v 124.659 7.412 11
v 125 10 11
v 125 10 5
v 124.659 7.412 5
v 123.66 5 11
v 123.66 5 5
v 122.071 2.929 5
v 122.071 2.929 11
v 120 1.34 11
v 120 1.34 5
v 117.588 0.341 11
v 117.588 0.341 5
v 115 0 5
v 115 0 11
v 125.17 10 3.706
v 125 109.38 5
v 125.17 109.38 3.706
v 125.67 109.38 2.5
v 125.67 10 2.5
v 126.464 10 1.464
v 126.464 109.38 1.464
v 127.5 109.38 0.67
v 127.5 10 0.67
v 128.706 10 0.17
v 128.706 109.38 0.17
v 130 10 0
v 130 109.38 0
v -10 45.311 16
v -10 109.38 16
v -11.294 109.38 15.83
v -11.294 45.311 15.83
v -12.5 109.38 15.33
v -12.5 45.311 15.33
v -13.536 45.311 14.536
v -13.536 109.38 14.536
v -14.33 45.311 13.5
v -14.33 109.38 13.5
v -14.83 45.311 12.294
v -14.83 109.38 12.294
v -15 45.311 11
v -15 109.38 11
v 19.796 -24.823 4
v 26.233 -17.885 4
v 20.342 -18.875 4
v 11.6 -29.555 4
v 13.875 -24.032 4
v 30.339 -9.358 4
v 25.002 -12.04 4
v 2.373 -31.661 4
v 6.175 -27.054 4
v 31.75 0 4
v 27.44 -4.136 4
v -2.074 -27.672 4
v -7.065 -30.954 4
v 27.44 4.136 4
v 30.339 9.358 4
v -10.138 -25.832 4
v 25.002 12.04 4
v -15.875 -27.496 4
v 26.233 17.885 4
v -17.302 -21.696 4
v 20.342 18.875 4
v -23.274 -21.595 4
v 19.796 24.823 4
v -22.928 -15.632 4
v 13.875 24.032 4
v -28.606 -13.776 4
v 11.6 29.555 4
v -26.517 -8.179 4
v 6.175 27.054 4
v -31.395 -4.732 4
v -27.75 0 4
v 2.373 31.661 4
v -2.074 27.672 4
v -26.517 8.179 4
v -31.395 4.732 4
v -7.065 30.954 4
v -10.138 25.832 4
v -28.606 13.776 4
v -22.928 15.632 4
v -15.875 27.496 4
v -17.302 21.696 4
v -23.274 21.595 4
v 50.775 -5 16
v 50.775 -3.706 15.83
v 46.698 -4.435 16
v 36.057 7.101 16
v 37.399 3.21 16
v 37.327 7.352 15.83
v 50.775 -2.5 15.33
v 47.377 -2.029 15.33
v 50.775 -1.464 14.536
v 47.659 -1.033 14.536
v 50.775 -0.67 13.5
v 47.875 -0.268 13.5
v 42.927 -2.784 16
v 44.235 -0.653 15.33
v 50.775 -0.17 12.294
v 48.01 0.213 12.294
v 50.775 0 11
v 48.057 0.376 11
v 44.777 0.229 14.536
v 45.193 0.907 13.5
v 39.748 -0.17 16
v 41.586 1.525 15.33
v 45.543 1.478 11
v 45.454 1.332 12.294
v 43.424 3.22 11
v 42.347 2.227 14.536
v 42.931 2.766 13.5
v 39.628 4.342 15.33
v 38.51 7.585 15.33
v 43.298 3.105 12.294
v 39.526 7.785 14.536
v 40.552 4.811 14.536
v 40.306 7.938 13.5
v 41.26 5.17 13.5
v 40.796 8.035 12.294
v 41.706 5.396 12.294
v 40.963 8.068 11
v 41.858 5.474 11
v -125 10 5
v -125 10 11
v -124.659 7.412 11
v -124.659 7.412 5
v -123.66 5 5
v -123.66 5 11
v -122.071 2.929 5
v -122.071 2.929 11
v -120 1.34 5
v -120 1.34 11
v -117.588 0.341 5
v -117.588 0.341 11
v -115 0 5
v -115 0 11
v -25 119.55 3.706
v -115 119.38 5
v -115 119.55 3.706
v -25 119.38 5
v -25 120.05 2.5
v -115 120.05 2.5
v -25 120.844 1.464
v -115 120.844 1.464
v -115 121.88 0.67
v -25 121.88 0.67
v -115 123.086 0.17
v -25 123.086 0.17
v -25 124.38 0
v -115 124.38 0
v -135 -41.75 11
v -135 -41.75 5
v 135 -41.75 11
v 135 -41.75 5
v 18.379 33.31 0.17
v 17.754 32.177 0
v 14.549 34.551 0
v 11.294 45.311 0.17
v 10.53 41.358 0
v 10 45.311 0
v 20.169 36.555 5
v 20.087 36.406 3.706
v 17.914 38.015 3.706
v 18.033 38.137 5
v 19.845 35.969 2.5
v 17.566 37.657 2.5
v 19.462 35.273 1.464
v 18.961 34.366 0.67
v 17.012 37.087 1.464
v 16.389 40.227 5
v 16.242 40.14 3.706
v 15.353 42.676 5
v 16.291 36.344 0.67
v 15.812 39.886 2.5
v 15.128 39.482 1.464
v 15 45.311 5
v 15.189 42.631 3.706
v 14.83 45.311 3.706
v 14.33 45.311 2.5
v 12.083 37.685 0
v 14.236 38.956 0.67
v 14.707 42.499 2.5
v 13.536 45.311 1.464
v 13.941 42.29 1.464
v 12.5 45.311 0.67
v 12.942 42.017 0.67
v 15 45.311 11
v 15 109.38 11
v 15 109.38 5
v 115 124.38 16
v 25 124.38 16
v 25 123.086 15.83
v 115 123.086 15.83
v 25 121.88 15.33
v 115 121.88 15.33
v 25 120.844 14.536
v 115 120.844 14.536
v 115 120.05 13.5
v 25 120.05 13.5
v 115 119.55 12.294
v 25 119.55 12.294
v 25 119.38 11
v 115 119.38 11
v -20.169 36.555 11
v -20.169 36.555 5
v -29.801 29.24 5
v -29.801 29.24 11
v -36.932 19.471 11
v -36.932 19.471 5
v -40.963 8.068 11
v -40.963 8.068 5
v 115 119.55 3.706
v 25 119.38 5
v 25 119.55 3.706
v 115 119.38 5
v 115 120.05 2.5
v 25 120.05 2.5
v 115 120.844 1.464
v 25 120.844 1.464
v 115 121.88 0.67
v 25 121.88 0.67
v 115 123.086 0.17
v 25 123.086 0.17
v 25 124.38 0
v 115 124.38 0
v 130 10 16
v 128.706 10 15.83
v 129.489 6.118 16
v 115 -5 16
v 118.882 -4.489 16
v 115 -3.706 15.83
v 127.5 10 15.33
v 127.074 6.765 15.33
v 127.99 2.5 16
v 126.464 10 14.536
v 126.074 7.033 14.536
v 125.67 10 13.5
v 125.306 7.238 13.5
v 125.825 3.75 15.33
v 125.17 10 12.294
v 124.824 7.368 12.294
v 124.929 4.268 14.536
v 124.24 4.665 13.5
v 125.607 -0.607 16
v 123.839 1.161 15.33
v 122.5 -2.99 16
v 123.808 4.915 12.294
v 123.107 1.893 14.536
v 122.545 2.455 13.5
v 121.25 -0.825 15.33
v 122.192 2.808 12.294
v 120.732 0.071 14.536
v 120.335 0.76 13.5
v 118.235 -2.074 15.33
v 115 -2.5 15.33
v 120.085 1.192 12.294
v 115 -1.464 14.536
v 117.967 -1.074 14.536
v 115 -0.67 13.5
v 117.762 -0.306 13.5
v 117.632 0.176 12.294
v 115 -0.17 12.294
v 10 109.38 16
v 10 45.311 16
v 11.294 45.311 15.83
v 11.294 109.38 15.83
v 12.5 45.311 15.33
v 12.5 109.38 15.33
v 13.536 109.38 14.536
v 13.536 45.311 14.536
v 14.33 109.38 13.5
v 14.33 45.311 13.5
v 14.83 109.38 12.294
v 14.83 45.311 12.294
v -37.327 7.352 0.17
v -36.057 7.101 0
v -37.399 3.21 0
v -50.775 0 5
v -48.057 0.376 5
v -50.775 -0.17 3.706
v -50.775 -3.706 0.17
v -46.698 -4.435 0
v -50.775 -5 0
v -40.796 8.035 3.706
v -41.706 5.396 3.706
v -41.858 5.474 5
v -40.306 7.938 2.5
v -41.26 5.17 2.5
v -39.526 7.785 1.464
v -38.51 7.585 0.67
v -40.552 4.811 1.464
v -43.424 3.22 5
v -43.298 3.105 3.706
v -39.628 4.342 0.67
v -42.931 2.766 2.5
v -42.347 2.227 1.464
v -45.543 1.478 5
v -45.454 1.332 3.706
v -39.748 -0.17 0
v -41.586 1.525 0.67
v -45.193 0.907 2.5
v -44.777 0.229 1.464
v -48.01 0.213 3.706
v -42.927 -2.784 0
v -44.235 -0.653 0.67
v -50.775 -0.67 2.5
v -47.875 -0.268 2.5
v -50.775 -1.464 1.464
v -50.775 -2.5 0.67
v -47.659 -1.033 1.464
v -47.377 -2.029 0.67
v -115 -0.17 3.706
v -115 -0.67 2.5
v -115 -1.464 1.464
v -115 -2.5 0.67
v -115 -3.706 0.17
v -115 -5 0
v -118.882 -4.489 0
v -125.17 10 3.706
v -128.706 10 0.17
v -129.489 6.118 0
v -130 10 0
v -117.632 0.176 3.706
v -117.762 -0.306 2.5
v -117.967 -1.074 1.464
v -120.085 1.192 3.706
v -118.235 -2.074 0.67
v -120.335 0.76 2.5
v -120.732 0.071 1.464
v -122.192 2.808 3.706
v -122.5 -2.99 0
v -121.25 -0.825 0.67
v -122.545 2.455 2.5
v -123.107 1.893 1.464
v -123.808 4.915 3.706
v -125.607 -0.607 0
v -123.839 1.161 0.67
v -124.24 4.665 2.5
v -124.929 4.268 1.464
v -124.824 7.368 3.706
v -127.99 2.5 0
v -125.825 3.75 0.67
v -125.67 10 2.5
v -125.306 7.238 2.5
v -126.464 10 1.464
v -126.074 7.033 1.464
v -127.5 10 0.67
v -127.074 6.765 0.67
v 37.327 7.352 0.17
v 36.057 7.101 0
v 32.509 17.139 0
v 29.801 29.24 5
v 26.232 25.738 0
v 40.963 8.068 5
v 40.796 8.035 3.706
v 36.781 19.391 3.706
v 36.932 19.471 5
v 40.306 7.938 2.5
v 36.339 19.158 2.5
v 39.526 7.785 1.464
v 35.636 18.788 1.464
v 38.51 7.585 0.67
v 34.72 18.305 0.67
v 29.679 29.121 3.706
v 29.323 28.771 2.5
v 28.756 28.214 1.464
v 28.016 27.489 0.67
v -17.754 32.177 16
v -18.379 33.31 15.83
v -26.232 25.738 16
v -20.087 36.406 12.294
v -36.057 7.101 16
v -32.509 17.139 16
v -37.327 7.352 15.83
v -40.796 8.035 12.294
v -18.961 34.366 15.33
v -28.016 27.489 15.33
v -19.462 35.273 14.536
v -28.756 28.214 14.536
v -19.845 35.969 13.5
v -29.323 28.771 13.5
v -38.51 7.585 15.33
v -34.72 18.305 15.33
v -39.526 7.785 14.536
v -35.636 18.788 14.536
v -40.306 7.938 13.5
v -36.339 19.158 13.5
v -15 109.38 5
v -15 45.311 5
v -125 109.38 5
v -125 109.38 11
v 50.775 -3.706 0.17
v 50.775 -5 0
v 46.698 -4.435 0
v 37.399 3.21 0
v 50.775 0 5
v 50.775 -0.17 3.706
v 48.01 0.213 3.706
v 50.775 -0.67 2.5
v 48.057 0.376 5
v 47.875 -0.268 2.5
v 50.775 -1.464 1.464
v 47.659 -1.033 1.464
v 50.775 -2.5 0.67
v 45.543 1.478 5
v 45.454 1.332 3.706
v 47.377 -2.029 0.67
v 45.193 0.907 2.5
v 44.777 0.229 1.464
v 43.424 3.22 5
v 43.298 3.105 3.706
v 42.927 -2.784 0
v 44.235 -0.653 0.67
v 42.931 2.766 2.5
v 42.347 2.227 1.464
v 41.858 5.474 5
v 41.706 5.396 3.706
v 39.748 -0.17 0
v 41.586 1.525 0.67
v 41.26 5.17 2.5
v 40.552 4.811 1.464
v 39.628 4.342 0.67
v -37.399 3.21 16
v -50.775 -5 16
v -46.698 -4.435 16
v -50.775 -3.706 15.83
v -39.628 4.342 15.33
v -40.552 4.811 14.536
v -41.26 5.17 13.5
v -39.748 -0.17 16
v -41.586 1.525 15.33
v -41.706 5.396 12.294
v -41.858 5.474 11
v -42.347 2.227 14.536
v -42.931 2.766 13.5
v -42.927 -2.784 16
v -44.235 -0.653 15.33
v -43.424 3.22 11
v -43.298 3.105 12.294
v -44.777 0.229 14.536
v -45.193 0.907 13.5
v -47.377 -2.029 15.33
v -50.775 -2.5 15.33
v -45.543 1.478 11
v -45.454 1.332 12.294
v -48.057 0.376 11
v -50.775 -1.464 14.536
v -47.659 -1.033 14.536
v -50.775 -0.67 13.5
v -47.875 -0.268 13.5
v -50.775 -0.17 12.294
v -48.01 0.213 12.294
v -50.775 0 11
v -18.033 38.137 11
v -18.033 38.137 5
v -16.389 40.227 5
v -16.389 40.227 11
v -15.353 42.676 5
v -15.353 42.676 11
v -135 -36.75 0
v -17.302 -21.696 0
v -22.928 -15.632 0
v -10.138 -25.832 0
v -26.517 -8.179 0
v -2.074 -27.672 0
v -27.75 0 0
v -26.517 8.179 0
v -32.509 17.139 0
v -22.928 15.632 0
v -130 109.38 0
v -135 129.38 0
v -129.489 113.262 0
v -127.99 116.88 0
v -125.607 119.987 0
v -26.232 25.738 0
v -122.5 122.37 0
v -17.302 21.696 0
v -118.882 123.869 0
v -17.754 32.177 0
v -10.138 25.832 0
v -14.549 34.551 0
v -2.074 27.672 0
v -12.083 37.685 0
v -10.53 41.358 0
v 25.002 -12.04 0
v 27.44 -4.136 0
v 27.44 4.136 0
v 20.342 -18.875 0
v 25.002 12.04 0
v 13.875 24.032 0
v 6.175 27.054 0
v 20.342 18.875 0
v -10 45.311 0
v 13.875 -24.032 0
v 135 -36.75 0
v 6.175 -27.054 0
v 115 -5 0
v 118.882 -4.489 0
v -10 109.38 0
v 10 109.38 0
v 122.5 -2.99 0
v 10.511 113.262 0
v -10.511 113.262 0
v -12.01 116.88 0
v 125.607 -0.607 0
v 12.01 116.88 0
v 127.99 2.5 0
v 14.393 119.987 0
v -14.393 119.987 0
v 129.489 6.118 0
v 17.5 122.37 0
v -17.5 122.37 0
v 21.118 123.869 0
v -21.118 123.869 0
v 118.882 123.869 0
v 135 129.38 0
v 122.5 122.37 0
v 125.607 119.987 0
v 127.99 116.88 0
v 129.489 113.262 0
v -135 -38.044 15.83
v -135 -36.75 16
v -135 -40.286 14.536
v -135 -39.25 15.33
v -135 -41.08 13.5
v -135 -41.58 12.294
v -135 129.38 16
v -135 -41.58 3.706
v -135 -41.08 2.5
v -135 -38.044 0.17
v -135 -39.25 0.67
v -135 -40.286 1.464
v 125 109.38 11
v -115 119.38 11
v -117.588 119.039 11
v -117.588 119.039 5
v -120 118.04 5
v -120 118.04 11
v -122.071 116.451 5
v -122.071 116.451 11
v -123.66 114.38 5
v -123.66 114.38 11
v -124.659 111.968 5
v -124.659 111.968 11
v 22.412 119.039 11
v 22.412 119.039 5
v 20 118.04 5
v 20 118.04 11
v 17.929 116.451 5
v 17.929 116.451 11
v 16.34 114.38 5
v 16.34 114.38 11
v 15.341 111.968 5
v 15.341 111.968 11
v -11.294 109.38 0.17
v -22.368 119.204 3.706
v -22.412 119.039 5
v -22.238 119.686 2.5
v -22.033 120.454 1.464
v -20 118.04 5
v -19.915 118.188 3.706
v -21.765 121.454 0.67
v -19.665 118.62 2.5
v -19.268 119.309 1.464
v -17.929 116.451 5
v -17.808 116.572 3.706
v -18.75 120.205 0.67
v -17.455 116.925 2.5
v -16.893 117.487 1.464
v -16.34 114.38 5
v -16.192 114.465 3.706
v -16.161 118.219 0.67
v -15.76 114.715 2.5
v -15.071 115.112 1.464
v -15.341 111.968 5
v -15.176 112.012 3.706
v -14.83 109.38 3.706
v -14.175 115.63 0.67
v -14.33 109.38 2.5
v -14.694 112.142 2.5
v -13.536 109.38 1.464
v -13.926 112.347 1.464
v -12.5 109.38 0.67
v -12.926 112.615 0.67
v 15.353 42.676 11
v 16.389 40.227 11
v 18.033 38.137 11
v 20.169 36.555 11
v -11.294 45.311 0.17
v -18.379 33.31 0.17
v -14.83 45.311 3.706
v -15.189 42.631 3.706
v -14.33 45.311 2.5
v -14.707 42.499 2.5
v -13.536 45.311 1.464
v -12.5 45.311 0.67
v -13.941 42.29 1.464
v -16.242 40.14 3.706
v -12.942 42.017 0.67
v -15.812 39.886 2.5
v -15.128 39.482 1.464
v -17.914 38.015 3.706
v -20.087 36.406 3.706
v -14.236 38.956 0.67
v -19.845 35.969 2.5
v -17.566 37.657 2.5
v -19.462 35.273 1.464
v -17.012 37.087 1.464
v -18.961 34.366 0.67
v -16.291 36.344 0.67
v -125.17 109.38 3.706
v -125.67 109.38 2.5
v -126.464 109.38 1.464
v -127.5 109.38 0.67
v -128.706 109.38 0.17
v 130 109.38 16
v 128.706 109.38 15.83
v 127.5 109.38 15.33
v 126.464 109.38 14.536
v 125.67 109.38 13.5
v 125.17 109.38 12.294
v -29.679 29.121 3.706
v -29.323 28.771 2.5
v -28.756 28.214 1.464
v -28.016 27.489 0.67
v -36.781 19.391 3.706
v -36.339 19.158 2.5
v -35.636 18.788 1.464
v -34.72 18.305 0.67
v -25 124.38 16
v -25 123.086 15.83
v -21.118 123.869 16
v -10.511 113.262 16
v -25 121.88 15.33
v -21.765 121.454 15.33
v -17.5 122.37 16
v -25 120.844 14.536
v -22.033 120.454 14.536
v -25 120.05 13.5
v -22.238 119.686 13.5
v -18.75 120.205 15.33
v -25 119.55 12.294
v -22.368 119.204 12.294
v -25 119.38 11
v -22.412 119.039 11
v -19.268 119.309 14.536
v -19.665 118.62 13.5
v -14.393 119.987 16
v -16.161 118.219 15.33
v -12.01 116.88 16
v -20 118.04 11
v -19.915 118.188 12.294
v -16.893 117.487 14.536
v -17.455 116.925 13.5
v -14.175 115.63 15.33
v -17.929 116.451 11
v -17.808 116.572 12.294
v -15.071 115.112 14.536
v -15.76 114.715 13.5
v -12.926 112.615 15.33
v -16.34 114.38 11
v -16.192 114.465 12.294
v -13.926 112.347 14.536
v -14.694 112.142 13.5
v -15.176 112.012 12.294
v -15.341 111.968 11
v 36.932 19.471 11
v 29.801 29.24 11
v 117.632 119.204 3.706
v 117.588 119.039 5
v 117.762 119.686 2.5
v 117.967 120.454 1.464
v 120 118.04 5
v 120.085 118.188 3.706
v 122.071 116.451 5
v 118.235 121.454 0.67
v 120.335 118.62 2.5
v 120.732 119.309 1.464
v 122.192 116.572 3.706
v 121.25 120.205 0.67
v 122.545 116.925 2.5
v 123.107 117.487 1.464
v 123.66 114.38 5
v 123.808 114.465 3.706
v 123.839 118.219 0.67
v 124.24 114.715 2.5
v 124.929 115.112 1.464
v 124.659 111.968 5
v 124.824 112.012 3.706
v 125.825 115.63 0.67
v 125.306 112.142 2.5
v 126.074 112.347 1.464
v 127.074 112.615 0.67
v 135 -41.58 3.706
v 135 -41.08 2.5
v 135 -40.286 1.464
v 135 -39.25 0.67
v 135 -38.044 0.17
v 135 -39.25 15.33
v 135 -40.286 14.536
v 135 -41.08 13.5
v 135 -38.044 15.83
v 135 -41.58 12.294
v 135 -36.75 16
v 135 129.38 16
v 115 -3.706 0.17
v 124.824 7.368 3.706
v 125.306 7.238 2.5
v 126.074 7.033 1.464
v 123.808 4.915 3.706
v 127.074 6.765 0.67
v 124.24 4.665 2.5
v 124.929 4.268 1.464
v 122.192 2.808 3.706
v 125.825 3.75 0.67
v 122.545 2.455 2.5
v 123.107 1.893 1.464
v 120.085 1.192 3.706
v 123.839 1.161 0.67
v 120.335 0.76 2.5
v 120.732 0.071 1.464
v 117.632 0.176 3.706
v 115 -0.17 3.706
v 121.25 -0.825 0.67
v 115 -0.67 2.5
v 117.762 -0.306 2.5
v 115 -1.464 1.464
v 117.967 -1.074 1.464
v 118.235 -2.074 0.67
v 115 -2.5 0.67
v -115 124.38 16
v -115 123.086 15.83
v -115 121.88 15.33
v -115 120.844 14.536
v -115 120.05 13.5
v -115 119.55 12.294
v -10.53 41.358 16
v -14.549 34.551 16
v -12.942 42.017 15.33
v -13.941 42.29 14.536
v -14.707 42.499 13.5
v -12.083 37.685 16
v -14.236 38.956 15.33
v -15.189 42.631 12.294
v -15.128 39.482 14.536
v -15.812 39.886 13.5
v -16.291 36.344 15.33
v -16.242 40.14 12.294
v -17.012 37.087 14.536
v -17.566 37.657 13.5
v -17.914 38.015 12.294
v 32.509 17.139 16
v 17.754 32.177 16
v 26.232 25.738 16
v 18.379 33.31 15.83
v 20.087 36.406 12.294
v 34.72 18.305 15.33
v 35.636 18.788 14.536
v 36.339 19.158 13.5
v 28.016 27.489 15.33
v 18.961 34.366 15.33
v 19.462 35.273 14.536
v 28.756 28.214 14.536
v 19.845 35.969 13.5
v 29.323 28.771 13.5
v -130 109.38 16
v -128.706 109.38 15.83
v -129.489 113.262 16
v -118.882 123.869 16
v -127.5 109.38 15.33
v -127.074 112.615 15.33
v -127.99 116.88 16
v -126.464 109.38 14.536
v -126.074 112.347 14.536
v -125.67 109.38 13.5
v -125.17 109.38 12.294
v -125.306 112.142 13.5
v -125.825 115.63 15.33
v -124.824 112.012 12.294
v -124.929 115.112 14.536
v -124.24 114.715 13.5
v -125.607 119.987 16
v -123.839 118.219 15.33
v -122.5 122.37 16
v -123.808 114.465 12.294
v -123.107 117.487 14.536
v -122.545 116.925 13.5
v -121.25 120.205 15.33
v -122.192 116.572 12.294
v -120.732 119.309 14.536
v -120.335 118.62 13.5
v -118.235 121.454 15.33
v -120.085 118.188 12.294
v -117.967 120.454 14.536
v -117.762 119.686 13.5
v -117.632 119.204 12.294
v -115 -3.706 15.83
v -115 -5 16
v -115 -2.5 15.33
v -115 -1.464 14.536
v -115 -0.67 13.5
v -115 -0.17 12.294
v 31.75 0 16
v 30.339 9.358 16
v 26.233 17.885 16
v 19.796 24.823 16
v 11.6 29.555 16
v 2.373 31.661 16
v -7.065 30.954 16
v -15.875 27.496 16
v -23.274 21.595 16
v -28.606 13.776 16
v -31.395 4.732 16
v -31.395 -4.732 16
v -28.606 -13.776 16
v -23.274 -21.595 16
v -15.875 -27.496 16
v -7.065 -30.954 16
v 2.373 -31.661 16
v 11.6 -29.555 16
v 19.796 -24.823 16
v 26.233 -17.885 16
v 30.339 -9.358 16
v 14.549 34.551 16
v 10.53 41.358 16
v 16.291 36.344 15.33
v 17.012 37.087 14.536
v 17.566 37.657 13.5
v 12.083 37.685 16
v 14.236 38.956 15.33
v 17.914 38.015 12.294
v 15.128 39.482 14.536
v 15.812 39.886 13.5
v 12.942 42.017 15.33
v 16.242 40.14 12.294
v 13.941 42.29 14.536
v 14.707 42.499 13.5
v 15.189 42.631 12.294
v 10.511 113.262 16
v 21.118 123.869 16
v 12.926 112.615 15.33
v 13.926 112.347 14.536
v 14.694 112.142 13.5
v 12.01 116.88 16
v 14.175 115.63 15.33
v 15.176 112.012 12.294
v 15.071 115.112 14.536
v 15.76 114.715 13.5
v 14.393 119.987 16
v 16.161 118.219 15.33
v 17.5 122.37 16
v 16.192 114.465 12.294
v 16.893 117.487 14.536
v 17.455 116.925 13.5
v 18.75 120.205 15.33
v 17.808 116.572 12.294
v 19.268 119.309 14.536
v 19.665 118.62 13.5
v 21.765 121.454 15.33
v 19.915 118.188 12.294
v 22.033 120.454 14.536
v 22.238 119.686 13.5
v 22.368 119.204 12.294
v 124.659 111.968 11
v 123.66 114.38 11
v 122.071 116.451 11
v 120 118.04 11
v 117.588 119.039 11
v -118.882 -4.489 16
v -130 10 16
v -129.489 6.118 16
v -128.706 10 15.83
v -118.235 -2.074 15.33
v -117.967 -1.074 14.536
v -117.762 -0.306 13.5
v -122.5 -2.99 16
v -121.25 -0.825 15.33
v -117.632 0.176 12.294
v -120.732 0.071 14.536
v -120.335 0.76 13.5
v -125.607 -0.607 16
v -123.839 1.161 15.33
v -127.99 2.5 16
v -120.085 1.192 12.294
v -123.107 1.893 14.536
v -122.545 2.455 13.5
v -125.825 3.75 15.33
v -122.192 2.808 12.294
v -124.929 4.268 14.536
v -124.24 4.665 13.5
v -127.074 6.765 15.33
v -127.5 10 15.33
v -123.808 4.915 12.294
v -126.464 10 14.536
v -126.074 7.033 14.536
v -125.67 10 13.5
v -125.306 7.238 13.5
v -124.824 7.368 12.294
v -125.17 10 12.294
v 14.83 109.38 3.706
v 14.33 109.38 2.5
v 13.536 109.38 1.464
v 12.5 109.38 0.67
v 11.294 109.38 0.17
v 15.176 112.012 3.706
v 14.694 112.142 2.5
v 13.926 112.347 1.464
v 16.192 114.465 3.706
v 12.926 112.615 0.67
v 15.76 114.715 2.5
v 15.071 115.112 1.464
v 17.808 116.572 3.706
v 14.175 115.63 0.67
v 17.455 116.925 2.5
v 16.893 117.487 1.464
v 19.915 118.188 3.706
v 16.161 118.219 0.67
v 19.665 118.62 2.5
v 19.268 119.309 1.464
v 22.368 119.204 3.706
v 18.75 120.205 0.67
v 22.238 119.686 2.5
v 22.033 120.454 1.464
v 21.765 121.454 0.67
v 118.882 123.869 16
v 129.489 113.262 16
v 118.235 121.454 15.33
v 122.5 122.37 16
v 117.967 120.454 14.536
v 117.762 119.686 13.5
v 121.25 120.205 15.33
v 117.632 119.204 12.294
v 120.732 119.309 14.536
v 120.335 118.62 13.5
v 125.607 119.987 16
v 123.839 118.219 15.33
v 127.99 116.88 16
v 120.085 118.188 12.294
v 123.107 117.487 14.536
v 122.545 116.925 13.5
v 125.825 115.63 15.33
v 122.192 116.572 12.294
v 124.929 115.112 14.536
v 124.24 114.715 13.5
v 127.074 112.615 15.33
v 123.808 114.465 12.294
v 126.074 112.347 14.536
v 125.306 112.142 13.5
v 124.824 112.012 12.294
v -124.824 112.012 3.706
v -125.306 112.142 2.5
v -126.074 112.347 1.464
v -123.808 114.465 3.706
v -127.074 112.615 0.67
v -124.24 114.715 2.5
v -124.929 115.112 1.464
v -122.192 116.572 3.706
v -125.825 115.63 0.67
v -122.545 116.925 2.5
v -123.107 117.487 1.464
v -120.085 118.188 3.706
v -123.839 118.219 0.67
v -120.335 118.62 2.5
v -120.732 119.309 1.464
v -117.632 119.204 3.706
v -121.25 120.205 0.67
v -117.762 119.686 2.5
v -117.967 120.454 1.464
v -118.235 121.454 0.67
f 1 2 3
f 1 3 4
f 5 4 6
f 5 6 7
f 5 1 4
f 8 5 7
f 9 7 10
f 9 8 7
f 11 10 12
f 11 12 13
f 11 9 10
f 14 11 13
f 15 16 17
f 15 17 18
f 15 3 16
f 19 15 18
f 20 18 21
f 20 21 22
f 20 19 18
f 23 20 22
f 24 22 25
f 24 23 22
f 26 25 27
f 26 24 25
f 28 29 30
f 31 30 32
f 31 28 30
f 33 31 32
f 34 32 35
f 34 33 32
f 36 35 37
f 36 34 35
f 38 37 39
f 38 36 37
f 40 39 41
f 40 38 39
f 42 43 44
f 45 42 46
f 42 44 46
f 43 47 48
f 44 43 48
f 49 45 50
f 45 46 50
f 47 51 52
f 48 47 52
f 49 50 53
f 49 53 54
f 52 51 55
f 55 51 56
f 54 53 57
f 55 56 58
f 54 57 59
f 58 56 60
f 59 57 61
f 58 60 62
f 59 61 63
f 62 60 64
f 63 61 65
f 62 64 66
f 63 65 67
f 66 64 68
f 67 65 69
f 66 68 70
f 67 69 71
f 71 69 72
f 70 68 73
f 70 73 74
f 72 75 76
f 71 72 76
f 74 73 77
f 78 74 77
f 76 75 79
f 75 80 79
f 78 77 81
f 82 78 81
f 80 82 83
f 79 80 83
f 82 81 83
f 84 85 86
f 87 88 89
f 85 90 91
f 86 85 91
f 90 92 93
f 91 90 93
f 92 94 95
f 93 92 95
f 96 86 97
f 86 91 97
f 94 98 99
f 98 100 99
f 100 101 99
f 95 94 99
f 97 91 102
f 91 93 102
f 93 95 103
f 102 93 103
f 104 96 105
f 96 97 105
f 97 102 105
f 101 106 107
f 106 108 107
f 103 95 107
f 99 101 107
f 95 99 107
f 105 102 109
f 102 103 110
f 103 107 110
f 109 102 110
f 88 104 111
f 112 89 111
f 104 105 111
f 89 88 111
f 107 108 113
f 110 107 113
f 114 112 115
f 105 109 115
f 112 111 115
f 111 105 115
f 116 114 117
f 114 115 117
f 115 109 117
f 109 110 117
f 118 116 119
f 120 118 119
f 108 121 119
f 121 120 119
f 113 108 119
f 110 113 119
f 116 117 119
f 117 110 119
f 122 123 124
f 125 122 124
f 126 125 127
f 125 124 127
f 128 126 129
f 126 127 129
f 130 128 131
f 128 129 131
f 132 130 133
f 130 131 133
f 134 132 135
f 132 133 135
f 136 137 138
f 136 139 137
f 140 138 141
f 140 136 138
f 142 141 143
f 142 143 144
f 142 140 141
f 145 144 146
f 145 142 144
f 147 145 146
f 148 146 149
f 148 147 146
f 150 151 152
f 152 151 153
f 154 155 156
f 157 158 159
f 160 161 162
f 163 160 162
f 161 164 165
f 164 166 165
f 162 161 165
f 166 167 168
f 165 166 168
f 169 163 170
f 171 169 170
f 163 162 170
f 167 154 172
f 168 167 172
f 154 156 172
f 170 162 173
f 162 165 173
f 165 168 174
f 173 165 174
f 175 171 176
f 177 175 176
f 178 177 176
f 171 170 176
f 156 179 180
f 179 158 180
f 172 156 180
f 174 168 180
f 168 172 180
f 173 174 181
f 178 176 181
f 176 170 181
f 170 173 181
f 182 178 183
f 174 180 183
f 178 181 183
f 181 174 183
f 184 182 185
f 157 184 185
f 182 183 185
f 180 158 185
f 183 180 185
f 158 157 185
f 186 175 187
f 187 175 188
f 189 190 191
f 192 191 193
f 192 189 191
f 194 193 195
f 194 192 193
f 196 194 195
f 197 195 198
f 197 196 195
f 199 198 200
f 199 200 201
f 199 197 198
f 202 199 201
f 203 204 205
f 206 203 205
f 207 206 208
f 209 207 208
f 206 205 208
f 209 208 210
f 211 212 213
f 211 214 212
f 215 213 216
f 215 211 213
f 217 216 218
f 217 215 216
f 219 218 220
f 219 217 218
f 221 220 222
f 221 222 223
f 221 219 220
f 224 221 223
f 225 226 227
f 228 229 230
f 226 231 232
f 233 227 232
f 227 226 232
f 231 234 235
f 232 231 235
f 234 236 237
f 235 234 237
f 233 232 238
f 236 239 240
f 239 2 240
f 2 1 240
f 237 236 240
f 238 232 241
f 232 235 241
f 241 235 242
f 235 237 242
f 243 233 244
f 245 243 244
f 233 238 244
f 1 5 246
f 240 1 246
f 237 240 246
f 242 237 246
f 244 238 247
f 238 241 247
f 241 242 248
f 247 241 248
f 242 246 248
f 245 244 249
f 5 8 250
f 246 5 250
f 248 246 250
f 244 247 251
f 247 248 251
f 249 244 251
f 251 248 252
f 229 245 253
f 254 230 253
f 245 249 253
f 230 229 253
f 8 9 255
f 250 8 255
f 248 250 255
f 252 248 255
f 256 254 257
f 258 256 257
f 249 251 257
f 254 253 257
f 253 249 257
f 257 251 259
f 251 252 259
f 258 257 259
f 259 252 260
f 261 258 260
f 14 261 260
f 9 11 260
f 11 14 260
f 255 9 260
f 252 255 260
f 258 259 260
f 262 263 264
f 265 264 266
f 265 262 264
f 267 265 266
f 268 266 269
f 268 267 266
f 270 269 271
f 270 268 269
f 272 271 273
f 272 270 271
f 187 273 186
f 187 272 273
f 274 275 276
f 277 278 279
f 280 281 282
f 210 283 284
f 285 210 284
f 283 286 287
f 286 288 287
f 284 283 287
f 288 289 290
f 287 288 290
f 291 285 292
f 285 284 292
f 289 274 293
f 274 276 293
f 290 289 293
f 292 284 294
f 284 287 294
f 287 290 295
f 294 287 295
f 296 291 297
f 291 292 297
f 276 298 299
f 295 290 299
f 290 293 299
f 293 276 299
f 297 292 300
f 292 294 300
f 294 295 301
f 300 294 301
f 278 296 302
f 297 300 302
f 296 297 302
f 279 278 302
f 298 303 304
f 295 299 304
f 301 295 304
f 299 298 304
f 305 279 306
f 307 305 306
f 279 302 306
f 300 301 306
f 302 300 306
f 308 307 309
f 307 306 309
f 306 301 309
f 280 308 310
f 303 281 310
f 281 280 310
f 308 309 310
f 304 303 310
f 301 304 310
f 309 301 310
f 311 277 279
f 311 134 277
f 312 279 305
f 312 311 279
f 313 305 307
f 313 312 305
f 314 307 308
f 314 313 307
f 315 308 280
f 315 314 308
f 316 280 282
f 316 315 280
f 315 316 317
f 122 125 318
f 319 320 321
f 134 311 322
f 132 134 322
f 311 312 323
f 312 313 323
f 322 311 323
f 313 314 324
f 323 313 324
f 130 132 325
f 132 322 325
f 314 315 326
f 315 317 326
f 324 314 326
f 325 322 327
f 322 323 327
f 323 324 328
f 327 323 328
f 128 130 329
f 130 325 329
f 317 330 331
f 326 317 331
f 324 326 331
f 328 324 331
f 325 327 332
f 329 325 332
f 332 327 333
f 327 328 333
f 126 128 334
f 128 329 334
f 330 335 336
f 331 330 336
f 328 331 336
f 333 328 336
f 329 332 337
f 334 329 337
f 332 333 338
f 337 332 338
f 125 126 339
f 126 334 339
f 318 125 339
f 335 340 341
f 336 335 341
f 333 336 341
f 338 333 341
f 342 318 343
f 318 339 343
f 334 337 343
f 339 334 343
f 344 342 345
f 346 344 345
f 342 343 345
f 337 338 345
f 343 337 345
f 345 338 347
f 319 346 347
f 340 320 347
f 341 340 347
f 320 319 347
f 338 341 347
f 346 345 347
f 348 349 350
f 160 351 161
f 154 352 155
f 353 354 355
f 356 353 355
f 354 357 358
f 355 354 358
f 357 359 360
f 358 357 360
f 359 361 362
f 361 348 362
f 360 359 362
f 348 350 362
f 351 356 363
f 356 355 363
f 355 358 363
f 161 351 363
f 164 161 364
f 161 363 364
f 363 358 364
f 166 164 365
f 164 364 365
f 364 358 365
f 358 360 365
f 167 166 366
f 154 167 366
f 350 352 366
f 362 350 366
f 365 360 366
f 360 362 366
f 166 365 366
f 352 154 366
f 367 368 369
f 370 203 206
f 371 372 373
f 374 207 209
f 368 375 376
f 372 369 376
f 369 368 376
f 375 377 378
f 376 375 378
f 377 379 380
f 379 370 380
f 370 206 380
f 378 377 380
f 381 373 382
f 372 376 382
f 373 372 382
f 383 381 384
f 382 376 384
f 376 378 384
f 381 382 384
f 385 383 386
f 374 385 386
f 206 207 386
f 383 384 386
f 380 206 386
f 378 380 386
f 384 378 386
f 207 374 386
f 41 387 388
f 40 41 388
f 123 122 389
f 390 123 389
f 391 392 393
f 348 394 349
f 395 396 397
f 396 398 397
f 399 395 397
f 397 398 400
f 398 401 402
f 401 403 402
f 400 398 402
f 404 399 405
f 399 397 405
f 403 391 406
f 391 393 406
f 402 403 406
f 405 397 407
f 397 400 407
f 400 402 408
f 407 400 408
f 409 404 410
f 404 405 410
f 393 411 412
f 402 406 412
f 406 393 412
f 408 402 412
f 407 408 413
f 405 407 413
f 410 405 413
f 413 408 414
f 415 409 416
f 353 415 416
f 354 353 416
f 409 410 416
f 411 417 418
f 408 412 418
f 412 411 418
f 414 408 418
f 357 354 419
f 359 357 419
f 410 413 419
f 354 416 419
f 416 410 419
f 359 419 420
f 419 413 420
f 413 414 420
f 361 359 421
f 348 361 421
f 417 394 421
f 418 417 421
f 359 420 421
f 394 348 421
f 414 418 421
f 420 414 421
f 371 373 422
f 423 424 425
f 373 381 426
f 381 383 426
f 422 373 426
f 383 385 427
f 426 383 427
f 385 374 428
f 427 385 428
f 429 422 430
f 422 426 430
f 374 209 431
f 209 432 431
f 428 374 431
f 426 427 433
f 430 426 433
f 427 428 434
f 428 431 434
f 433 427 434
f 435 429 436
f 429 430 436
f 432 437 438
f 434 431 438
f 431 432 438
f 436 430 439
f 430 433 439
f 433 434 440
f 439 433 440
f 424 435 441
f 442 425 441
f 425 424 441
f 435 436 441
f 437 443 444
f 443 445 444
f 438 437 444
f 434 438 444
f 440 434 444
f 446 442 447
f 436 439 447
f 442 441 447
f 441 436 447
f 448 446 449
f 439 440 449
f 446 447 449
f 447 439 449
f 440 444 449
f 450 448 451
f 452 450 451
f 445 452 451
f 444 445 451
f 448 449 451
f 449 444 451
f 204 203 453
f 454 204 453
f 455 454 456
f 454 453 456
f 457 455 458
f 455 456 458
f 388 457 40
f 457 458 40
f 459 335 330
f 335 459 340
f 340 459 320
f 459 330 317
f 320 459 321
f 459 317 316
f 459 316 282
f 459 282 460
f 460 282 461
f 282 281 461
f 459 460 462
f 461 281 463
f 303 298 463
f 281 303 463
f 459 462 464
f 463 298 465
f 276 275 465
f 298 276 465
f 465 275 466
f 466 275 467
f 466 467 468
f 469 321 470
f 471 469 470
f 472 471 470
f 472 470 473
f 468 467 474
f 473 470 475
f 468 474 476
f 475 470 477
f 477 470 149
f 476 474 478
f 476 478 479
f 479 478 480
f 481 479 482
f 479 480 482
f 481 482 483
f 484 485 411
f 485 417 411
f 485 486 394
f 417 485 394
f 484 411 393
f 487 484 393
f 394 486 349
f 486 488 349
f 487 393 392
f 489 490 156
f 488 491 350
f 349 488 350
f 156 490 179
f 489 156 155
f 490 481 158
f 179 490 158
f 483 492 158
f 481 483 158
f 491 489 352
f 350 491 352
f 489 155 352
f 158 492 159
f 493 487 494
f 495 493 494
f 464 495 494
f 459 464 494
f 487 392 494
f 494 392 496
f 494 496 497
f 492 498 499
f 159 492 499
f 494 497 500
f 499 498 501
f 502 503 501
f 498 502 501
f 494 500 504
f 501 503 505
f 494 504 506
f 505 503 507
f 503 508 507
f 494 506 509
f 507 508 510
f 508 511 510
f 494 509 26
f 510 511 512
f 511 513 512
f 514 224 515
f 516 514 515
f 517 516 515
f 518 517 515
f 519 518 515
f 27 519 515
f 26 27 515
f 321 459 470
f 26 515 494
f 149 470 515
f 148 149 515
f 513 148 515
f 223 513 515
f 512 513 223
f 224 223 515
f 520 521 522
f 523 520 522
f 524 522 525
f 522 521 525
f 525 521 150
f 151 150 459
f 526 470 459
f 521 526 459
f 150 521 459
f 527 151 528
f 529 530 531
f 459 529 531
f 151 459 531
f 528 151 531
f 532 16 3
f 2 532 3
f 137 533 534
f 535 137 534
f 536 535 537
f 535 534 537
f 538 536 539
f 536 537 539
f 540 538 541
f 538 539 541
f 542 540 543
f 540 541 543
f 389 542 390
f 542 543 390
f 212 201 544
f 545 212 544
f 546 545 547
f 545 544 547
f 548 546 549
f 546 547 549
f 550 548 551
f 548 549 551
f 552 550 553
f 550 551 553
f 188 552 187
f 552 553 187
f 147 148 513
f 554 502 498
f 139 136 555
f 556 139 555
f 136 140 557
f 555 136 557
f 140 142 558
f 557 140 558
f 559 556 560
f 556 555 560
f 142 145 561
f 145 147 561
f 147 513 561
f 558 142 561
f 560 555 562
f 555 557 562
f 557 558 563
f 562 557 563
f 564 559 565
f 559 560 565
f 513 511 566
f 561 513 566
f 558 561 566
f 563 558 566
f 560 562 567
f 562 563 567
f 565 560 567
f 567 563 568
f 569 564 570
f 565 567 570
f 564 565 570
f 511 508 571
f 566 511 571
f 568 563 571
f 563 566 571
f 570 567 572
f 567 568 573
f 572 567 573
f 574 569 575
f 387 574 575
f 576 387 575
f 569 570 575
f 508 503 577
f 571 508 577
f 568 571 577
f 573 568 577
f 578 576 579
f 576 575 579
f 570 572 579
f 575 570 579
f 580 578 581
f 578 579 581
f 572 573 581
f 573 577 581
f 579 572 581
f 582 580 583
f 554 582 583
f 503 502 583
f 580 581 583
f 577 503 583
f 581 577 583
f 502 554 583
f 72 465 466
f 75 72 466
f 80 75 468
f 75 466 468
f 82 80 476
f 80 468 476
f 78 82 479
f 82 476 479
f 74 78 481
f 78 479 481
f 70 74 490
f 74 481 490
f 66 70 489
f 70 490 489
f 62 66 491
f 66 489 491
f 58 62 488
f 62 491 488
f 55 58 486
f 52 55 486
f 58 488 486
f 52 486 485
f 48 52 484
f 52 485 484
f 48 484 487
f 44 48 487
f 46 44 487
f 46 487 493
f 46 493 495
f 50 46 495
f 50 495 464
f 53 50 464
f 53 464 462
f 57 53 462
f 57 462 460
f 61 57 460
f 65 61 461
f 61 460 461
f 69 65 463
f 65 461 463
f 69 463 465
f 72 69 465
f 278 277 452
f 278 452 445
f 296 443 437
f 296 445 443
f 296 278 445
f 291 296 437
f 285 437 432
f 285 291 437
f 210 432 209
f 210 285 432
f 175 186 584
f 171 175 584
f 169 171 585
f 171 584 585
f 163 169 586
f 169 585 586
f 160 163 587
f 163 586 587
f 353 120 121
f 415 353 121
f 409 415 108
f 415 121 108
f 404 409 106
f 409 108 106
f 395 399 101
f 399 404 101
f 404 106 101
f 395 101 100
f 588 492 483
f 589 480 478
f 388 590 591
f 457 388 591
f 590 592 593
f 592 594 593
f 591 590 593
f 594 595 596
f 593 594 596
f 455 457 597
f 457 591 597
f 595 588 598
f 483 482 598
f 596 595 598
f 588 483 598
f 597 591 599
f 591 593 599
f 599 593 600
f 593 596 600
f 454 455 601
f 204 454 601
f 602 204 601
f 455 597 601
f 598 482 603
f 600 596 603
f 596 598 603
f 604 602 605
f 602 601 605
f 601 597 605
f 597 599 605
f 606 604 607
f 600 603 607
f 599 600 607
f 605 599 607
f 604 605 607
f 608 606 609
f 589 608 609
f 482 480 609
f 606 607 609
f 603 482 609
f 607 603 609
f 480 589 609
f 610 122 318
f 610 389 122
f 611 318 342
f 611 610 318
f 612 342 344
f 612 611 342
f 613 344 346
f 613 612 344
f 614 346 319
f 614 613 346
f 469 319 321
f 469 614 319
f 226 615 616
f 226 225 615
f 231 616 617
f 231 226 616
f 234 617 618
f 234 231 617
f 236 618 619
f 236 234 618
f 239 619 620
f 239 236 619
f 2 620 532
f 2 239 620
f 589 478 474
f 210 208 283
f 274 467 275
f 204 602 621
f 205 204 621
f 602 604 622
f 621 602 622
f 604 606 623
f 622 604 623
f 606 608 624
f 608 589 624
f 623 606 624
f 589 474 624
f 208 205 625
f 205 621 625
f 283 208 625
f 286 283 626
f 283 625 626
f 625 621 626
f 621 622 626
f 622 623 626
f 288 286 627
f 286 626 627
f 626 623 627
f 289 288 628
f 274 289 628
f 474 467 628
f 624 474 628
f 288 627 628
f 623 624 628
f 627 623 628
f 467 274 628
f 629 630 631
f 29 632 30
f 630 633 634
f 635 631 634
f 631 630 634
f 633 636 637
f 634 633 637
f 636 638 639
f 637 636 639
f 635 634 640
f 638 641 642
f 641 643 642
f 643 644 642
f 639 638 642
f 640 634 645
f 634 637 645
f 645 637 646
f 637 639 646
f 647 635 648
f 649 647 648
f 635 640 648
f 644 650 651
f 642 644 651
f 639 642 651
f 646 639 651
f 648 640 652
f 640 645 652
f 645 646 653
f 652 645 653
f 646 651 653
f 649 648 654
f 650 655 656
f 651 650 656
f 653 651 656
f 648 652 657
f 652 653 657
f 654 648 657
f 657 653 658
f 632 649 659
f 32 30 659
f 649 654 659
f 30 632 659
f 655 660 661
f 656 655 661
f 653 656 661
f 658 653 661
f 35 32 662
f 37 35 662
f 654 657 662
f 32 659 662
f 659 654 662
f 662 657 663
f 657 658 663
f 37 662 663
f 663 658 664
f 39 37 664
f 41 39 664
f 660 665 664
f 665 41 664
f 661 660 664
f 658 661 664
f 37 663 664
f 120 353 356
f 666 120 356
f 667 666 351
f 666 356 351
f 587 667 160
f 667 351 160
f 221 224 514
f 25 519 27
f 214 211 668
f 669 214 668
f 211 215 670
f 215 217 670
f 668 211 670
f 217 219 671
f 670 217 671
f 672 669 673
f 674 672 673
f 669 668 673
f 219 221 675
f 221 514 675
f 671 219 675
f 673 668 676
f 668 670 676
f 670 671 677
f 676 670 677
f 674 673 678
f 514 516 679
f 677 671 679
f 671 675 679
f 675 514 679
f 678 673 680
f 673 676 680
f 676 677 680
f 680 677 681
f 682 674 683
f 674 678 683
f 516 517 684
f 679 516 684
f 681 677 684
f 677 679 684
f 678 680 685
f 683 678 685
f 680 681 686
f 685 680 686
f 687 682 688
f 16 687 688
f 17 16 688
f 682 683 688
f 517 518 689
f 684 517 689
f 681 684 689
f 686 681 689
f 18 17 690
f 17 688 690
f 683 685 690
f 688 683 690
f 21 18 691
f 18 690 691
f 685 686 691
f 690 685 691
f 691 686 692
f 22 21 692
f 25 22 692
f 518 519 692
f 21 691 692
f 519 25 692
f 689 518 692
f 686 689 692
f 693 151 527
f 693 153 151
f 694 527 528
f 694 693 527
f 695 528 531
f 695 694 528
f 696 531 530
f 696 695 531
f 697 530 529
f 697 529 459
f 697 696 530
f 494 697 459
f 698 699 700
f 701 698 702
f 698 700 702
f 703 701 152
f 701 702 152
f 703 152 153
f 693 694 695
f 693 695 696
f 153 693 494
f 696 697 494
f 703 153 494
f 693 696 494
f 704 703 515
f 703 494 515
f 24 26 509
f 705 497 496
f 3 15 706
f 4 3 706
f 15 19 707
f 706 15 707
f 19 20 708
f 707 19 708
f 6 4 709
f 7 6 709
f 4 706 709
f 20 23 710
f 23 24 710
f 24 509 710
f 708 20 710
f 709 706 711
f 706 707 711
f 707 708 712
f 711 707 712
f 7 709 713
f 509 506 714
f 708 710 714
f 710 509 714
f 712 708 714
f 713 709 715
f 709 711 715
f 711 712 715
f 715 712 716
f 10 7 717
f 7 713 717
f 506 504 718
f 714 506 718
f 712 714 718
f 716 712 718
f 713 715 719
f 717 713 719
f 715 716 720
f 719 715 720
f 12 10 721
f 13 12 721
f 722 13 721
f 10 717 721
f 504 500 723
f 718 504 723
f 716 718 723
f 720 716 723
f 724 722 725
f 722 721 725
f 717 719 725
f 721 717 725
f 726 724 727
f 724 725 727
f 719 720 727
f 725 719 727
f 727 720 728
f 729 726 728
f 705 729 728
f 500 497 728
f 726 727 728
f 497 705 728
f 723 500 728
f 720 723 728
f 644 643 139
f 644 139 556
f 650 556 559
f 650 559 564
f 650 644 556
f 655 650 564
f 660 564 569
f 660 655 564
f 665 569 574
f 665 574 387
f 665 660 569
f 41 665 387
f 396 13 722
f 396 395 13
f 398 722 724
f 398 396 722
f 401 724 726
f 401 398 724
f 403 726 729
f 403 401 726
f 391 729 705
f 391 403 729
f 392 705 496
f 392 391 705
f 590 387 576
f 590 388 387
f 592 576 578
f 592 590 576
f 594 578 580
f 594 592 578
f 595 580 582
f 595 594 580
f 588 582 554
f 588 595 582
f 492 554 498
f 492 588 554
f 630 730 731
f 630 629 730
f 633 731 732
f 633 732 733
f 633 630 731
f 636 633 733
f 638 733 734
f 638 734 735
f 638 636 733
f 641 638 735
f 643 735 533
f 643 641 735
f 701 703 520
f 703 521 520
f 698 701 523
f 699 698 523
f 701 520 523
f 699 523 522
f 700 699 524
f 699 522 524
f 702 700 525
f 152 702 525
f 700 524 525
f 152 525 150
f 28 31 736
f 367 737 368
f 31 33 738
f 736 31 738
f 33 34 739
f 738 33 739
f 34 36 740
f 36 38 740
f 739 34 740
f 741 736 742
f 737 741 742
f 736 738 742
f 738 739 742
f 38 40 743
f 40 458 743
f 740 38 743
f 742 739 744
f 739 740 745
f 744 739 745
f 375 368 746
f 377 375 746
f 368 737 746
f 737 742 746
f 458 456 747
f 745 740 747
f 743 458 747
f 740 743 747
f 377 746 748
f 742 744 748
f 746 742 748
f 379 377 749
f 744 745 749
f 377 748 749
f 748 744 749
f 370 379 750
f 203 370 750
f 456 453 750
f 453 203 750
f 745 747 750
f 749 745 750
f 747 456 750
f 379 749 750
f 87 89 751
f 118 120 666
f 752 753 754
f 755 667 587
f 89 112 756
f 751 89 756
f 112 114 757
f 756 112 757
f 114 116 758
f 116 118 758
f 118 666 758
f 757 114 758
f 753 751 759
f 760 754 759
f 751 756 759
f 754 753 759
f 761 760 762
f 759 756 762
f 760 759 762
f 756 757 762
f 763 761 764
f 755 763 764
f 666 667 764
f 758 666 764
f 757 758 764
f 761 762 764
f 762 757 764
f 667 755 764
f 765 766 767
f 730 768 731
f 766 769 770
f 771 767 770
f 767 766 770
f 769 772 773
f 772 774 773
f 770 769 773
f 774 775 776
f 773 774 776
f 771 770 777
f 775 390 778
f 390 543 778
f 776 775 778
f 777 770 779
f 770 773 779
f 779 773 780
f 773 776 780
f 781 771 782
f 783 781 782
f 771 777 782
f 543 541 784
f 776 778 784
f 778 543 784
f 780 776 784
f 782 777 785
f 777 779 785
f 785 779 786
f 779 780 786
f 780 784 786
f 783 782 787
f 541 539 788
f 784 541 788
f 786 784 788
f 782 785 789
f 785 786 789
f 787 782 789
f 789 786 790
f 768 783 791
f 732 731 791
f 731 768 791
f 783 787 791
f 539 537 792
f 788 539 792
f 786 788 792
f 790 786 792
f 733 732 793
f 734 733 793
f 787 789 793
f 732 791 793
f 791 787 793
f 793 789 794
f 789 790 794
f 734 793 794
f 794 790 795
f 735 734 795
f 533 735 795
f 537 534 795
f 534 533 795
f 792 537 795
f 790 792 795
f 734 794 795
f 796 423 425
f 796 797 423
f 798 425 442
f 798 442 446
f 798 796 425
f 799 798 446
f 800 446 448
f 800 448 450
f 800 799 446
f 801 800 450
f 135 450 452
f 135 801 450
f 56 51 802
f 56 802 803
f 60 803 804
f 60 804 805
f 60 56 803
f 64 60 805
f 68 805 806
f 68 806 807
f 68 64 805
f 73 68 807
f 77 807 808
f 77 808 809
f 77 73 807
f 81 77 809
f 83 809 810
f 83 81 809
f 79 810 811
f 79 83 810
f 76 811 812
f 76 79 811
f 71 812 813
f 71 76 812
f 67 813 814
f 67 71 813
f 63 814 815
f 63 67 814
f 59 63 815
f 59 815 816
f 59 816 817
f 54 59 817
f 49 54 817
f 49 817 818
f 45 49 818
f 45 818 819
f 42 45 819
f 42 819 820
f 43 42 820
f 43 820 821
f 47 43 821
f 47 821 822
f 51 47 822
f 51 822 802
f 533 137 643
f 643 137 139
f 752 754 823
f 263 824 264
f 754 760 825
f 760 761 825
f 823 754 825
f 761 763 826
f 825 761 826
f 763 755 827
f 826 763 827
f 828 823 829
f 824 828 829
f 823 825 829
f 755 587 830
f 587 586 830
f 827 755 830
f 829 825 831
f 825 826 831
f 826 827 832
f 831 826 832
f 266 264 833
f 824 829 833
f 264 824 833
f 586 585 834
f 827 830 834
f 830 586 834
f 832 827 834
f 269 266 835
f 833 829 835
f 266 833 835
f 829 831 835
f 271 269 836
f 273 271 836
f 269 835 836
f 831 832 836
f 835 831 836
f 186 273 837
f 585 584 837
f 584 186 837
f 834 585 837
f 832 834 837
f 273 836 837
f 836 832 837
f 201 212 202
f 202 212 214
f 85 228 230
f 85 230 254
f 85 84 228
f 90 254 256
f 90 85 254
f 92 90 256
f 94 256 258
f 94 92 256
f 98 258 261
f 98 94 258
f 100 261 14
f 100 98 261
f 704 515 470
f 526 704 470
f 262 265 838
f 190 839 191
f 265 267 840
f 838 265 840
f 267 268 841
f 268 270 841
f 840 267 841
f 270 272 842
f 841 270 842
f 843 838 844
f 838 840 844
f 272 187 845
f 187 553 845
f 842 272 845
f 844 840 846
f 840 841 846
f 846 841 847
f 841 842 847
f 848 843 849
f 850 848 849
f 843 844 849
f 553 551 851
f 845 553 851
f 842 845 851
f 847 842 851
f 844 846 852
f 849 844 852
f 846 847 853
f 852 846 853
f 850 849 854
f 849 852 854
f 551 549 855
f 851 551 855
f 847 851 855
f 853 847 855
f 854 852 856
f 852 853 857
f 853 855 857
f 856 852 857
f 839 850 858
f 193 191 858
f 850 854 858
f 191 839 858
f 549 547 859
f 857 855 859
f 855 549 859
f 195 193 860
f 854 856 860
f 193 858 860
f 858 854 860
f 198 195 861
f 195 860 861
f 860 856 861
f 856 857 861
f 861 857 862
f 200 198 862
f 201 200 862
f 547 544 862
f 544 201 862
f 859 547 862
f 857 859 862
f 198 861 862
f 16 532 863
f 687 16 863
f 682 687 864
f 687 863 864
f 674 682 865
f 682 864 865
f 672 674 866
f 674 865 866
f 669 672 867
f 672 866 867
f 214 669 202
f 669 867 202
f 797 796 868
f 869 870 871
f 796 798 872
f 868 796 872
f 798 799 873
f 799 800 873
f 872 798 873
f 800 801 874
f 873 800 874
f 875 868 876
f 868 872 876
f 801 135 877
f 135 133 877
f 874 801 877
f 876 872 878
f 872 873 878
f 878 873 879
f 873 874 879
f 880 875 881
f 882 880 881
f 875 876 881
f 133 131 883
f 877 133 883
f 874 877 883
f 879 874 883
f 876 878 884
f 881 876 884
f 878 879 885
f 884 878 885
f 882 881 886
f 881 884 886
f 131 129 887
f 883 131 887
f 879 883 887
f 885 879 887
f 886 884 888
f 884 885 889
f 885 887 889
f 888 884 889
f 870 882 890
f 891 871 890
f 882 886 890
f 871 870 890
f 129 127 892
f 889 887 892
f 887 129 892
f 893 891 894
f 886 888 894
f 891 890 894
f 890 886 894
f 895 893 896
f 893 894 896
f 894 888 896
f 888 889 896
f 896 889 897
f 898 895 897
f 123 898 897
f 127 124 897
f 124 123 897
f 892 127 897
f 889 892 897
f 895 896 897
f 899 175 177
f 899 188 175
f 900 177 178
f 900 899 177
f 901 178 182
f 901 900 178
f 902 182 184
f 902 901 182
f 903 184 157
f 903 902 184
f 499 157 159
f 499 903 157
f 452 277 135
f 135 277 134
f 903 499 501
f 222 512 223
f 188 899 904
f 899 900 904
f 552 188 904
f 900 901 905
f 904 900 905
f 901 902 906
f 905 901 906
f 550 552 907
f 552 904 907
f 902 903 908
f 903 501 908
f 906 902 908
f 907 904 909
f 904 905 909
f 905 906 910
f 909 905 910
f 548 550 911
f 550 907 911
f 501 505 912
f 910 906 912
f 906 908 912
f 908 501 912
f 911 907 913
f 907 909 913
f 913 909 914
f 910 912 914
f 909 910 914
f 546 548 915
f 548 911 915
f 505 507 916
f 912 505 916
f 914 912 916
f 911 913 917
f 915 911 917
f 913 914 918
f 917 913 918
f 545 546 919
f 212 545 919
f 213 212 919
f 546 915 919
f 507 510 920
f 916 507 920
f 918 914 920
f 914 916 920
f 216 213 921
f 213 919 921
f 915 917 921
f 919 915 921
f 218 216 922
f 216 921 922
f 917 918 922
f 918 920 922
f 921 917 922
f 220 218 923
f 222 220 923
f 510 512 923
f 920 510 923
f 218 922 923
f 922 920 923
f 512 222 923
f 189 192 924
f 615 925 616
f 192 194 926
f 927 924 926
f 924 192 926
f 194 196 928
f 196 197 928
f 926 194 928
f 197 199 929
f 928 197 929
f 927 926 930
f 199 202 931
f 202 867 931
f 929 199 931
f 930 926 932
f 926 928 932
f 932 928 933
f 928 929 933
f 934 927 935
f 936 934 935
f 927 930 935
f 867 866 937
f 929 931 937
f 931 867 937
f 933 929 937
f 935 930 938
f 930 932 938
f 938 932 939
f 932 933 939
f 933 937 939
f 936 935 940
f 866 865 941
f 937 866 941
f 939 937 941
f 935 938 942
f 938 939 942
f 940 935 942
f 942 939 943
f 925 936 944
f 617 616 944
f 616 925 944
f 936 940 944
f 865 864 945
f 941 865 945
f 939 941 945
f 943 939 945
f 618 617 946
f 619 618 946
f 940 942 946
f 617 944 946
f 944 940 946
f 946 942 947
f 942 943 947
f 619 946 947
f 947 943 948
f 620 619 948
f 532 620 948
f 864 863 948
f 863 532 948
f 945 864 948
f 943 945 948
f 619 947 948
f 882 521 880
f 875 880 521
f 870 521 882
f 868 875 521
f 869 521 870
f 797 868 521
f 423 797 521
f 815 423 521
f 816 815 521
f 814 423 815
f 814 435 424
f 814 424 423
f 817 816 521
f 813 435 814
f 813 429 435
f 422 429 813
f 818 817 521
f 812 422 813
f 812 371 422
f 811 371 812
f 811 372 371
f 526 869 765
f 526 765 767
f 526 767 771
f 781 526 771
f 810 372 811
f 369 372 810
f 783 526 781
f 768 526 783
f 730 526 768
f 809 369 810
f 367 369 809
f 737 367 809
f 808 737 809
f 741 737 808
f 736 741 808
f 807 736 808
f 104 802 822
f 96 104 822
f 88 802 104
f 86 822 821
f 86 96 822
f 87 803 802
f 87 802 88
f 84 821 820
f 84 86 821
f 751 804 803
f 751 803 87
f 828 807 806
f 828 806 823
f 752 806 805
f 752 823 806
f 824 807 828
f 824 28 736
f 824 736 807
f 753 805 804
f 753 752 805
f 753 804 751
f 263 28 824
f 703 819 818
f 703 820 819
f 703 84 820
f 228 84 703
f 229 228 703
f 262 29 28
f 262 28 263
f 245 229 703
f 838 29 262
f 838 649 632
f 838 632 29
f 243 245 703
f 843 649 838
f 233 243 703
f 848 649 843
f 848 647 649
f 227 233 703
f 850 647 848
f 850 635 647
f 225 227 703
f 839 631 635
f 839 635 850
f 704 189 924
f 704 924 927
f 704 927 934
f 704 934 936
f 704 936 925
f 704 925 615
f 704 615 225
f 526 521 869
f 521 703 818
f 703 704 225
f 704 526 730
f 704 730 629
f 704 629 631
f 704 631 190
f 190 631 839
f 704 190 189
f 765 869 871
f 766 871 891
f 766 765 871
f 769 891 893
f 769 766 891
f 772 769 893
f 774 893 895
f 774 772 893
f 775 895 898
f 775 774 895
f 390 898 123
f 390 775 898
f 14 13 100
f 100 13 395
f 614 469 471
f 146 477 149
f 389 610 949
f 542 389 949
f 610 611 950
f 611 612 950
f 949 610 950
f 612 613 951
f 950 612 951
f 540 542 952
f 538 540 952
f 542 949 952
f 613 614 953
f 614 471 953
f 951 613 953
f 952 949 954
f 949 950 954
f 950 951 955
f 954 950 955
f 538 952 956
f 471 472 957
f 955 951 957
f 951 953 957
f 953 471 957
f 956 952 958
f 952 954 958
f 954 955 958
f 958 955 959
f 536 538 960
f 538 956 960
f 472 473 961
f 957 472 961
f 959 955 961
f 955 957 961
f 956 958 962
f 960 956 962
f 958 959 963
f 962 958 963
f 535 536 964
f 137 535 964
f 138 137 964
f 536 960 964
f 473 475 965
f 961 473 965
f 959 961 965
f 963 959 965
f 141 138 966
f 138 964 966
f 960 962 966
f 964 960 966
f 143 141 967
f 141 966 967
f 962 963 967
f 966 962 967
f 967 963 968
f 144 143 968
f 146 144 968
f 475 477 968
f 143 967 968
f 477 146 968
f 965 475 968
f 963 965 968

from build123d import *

# Parameters (mm, degrees)
SKETCH1_R            = 41.75
SKETCH1_R_2          = 31.75
BEARING_HOLDER_DEPTH = 16
SKETCH2_R            = 31.75
SKETCH2_R_2          = 27.75
BEARING_LIP_DEPTH    = 4
BOX_START            = -16
BOX_ADAPTER_DEPTH    = 16
STRUCTURAL_FILLETS_R = 10
SMALLER_FILLETS_R    = 5


with BuildPart() as part:
    # Sketch1 → Bearing holder (new body)
    with BuildSketch(Plane.XY):
        Circle(SKETCH1_R)
        Circle(SKETCH1_R_2, mode=Mode.SUBTRACT)
    extrude(amount=BEARING_HOLDER_DEPTH)

    # Sketch2 → Bearing lip (add)
    with BuildSketch(Plane(origin=(0, 0, 0), x_dir=(-1, 0, 0), z_dir=(0, 0, -1))):
        Circle(SKETCH2_R)
        Circle(SKETCH2_R_2, mode=Mode.SUBTRACT)
    extrude(amount=-BEARING_LIP_DEPTH)

    # Sketch3 → Box adapter (add)
    with BuildSketch(Plane.XY.offset(16).offset(BOX_START)):
        Polygon((-135, -41.75), (-125, -41.75), (-41.75, -41.75), (41.75, -41.75), (125, -41.75), (135, -41.75), (135, 129.38), (-135, 129.38), align=None)
        with BuildLine():
            Line((-125, 0), (-125, 119.38))
            Line((-125, 119.38), (-15, 119.38))
            Line((-15, 119.38), (-15, 38.962321543))
            ThreePointArc((-15, 38.962321543), (0, 41.75), (15, 38.962321543))
            Line((15, 38.962321543), (15, 119.38))
            Line((15, 119.38), (125, 119.38))
            Line((125, 119.38), (125, 0))
            Line((125, 0), (41.75, 0))
            Line((41.75, 0), (36.75, 0))
            ThreePointArc((36.75, 0), (0, -36.75), (-36.75, 0))
            Line((-36.75, 0), (-41.75, 0))
            Line((-41.75, 0), (-125, 0))
        make_face(mode=Mode.SUBTRACT)
    extrude(amount=BOX_ADAPTER_DEPTH)

    # Structural fillets
    structural_fillets_edges = [part.edges().sort_by_distance(p)[0] for p in [
        (-41.75, 0, 8),
        (41.75, 0, 8),
        (-125, 0, 8),
        (-15, 119.38, 8),
        (-15, 38.962321543, 8),
        (15, 38.962321543, 8),
        (15, 119.38, 8),
        (125, 119.38, 8),
        (125, 0, 8),
        (-125, 119.38, 8),
    ]]
    fillet(structural_fillets_edges, radius=STRUCTURAL_FILLETS_R)

    # Smaller fillets
    smaller_fillets_edges = [part.edges().sort_by_distance(p)[0] for p in [
        (122.071067812, 2.928932188, 16),
        (122.071067812, 2.928932188, 0),
        (-17.928932188, 116.451067812, 16),
        (-17.928932188, 116.451067812, 0),
        (122.071067812, 116.451067812, 16),
        (122.071067812, 116.451067812, 0),
        (17.928932188, 116.451067812, 16),
        (17.928932188, 116.451067812, 0),
        (-122.071067812, 116.451067812, 16),
        (-122.071067812, 116.451067812, 0),
        (0, -41.75, 0),
        (0, -41.75, 16),
        (82.887312284, 0, 0),
        (82.887312284, 0, 16),
        (33.72193708, 24.6149032, 16),
        (33.72193708, 24.6149032, 0),
        (15, 77.345366362, 16),
        (15, 77.345366362, 0),
        (-82.887312284, 0, 16),
        (-82.887312284, 0, 0),
        (-33.72193708, 24.6149032, 0),
        (-33.72193708, 24.6149032, 16),
        (-15, 77.345366362, 16),
        (-15, 77.345366362, 0),
        (-125, 59.69, 16),
        (-125, 59.69, 0),
        (125, 59.69, 16),
        (125, 59.69, 0),
        (-70, 119.38, 16),
        (-70, 119.38, 0),
        (70, 119.38, 16),
        (70, 119.38, 0),
        (44.423391282, 2.27589256, 16),
        (44.423391282, 2.27589256, 0),
        (16.388694096, 40.226894545, 16),
        (16.388694096, 40.226894545, 0),
        (-44.423391282, 2.27589256, 0),
        (-44.423391282, 2.27589256, 16),
        (-16.388694096, 40.226894545, 16),
        (-16.388694096, 40.226894545, 0),
        (-122.071067812, 2.928932188, 16),
        (-122.071067812, 2.928932188, 0),
    ]]
    fillet(smaller_fillets_edges, radius=SMALLER_FILLETS_R)


solid = part.part
